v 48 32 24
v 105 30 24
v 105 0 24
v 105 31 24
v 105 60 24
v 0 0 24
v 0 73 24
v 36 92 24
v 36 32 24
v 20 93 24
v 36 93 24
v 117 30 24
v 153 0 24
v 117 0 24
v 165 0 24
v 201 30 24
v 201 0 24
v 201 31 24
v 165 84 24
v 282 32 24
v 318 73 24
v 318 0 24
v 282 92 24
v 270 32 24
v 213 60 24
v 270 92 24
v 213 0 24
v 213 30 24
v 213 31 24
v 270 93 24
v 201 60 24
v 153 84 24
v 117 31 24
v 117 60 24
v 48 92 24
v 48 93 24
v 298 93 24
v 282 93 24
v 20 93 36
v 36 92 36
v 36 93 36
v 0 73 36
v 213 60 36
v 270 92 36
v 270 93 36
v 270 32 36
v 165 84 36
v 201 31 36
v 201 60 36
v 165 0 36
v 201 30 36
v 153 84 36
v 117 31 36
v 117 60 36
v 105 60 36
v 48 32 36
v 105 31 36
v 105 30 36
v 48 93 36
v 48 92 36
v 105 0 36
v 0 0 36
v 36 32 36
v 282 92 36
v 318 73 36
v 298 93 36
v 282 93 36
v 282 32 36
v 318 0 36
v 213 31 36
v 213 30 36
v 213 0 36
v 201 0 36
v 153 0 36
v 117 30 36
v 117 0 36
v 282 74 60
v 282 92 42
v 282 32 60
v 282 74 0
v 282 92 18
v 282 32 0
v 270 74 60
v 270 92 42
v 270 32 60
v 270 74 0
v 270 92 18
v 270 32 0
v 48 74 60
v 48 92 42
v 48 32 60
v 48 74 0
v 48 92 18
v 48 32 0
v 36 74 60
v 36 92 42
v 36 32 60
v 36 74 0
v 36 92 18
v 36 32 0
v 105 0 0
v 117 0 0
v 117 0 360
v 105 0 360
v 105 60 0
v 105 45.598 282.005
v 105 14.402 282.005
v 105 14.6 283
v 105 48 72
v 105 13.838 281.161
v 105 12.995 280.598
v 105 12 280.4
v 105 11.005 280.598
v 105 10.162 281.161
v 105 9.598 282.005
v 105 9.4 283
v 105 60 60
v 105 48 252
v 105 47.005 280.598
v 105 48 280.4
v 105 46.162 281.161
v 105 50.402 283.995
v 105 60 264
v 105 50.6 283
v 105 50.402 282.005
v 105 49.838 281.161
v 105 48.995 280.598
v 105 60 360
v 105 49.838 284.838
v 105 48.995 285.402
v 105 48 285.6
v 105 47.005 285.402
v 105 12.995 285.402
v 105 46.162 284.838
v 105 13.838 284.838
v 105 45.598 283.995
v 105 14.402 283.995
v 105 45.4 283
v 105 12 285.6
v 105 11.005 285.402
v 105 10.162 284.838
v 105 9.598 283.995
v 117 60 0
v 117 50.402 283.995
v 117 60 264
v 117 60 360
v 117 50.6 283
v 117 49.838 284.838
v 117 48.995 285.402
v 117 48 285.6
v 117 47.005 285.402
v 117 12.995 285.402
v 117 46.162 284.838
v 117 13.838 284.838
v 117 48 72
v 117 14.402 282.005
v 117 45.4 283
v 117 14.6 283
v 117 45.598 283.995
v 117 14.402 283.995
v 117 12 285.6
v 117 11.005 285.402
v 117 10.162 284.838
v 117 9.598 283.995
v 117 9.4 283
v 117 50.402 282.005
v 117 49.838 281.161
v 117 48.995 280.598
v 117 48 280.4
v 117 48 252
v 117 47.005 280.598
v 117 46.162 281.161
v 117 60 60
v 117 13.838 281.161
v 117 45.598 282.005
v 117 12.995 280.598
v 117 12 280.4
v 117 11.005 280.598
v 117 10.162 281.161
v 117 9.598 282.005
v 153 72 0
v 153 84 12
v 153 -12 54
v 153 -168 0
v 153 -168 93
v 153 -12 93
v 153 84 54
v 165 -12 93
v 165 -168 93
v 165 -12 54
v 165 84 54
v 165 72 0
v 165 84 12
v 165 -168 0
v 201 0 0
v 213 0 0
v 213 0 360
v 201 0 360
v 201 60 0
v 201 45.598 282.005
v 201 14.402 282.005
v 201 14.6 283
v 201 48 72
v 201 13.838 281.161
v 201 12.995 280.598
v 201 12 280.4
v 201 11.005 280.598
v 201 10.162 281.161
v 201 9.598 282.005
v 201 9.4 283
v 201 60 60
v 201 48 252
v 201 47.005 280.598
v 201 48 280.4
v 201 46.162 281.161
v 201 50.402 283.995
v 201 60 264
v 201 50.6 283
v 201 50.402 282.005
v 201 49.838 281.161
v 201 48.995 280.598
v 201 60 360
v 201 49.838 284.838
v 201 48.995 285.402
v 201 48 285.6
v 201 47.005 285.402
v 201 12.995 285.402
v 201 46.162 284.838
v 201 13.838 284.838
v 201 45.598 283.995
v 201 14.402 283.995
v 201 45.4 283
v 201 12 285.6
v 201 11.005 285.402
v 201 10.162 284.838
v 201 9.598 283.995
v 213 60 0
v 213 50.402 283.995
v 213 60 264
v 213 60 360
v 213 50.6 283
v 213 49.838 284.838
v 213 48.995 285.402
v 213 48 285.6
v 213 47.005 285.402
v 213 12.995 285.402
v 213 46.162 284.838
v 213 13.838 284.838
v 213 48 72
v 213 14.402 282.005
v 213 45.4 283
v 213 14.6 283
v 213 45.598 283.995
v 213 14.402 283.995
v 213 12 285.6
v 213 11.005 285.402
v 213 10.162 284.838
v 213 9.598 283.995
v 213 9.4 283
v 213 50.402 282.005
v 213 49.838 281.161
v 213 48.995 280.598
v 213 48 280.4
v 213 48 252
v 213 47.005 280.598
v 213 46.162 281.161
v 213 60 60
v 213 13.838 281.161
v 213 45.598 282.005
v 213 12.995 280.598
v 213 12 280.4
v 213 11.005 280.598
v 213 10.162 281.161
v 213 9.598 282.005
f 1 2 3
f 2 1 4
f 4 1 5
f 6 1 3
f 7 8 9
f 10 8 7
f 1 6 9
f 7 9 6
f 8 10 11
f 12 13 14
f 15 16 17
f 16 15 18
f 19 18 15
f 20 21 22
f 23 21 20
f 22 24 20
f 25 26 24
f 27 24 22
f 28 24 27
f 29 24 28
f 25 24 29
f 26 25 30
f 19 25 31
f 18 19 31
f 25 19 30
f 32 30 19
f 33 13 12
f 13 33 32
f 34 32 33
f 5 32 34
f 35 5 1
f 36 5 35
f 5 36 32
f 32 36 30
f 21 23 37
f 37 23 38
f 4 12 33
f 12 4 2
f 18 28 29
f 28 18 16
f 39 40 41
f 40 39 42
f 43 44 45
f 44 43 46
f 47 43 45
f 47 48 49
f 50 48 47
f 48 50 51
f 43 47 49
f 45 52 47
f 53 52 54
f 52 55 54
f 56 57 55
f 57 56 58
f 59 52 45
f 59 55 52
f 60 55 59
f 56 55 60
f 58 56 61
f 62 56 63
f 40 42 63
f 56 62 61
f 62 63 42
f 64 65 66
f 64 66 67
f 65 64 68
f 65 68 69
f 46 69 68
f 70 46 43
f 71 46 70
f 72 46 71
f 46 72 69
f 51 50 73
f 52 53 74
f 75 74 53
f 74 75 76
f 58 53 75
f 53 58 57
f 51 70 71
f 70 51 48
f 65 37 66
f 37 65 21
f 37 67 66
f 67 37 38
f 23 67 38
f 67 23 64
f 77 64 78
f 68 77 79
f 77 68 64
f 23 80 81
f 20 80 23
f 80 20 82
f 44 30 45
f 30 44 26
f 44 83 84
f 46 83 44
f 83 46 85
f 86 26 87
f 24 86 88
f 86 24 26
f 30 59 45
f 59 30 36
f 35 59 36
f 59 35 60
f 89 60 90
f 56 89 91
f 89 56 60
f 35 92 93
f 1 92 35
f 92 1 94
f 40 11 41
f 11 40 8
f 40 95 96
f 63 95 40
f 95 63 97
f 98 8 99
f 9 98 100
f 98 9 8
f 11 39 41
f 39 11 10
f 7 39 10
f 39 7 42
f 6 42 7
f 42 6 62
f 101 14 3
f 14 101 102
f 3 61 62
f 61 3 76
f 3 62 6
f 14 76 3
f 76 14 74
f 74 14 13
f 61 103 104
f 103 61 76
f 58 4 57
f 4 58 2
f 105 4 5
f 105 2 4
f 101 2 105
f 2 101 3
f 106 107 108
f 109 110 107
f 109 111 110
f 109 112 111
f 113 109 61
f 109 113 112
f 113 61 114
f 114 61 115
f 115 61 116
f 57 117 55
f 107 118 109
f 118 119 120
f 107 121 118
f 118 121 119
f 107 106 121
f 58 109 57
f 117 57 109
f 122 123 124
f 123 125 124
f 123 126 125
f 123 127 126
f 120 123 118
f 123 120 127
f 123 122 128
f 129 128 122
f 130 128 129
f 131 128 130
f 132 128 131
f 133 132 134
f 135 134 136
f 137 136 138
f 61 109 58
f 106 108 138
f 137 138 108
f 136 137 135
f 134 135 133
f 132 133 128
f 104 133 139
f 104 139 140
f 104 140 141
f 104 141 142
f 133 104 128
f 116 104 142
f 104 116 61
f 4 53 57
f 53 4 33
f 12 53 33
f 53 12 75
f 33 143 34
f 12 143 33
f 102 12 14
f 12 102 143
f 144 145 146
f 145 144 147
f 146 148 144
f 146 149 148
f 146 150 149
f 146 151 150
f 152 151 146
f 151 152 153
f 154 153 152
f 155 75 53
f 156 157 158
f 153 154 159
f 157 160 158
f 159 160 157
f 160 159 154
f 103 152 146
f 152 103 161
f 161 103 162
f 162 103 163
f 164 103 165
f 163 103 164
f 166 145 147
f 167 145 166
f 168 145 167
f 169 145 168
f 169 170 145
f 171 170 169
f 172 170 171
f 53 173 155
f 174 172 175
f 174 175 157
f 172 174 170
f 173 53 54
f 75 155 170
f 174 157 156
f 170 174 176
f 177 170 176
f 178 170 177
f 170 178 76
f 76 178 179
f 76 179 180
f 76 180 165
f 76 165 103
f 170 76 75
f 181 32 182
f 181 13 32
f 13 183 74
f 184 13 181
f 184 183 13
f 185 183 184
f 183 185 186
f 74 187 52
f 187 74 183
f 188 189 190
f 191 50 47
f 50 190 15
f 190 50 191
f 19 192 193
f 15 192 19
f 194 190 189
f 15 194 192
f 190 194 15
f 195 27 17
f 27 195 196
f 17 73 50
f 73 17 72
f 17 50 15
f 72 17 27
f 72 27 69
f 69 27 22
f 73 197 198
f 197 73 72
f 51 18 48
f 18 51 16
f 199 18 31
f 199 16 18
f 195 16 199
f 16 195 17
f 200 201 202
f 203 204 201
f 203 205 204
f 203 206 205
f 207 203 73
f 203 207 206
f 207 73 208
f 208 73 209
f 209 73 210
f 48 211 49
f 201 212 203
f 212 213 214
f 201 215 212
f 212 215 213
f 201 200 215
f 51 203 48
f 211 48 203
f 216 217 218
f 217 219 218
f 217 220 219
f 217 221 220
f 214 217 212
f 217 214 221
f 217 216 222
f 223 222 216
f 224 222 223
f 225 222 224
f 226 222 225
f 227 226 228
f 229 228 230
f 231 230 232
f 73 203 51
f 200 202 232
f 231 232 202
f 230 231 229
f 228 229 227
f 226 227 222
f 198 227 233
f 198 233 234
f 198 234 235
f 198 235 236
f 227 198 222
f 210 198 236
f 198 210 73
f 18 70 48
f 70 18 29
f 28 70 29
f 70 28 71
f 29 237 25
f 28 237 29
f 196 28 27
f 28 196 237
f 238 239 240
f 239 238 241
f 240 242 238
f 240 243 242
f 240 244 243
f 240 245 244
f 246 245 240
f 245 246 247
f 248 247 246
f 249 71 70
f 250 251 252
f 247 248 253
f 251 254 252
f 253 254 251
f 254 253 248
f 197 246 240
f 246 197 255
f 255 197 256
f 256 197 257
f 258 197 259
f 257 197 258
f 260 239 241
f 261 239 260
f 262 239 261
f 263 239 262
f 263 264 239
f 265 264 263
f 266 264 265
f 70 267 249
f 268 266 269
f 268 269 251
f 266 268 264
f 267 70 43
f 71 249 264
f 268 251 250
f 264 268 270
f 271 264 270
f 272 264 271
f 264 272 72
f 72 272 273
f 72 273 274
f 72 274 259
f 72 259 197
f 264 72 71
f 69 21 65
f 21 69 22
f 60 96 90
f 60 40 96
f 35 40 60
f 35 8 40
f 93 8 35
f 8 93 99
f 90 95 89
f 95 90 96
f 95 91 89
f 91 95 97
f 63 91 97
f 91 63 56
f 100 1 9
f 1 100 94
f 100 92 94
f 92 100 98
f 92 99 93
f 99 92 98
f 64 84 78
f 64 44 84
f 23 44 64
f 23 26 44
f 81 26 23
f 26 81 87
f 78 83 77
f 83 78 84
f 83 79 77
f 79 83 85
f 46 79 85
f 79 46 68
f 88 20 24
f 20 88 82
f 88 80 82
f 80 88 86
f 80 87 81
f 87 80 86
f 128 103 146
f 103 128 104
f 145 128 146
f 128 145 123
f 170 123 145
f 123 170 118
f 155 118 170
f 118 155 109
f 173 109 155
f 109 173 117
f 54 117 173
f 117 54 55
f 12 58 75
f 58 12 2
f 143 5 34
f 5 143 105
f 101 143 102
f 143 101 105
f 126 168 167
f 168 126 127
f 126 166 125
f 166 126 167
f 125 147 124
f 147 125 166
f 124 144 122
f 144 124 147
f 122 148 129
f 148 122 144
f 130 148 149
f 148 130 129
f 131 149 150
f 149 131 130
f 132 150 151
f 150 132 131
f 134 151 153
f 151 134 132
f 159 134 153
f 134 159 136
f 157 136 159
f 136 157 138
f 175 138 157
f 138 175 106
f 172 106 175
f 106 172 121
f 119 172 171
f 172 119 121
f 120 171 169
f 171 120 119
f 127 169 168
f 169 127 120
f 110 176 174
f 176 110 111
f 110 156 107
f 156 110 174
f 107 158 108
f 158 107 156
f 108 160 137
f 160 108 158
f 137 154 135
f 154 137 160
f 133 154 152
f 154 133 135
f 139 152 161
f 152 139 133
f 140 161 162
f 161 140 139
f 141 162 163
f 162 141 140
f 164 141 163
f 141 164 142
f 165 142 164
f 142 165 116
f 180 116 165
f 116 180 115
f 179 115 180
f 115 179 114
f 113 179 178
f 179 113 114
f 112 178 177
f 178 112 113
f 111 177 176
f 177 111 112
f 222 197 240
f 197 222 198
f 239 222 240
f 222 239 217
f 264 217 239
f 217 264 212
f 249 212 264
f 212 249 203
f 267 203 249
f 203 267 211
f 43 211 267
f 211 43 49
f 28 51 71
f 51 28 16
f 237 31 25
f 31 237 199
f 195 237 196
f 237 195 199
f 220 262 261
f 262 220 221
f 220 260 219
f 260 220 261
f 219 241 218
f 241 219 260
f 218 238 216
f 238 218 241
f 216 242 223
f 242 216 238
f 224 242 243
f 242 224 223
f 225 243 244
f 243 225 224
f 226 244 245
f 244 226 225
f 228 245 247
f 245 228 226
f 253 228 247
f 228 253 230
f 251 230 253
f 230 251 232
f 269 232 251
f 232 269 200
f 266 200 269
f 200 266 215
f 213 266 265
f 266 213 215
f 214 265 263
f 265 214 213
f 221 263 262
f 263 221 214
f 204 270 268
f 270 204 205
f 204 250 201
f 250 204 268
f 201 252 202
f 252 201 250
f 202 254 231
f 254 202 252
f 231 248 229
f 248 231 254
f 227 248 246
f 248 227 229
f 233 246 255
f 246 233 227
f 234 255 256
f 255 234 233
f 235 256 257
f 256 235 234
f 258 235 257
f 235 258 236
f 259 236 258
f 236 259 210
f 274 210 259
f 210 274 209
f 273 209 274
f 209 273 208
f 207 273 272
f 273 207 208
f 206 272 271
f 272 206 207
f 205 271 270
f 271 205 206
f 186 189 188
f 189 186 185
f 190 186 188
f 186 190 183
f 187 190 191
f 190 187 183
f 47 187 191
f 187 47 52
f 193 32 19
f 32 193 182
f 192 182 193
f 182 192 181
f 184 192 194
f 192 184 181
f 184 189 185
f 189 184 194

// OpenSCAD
// ==========================================================================
//  GENERATED FILE -- DO NOT EDIT.
//  Produced by build/build.py from components/Turtle_Bottom_Ballast_Fin.scad
//  Turtle Body version 6.7.4
//  Edit lib/ and src/ instead, then run: python3 build/build.py
// ==========================================================================
/*
 Hope Turtle — standalone ballast attachment. Units: mm.
 License: CERN-OHL-S-2.0.
 Two green core slats, one orange bottom board, two red lock feet, one
 yellow ballast fin. No bottle. Individual pieces lie flat on Z=0;
 the assembly raises its lowest component to Z=0.

 SOURCE FILE — geometry lives in lib/ballast_fin.scad + lib/params.scad.
 The committed self-contained file is generated by build/build.py.
*/

part = "assembly"; // [assembly,core_slat,bottom_board,lock_foot,fin]
enable_color_coding = true;
ballast_fin_inspection_pullout = 0; // mm; 0 seats the fin

// [bundle] begin use <../../lib/ballast_fin.scad>
// ==========================================================================
//  Turtle Body -- bottom ballast attachment  (lib module)
// --------------------------------------------------------------------------
//  Two green core slats, one orange bottom board, two red lock feet, one
//  yellow ballast fin. No bottle. See CLAUDE.md s12.
//
//  Use clear inner-face spacing (= bottle_diameter), not centre spacing, for
//  bottle clearance. The yellow fin's bottle-seat cut is enlarged by one
//  stock thickness so the bottle clears it -- preserved here. Ballast joints
//  keep nominal stock slot widths (the rear fin's 0.2 mm allowance is NOT
//  added here).
//
//  Definitions only. Geometry is emitted by local_ballast_assembly() or the
//  individual part modules.
// ==========================================================================

// [bundle] begin use <params.scad>
// ==========================================================================
//  Turtle Body -- shared dimension contract
// --------------------------------------------------------------------------
//  The single source of truth for every dimension that more than one
//  subsystem depends on. Values are exposed as zero-argument functions so
//  this file can be pulled in with `use <params.scad>` (which ignores
//  top-level variable assignments) without polluting any namespace.
//
//  lib/ modules take these as DEFAULT argument values:
//      module control_cap(roof_t = p_cap_roof_t(), ...) { ... }
//  so a src/ wrapper can still override one value from its customizer block
//  while every other subsystem keeps the shared number.
//
//  Rules:
//   * one function per concept, canonical name (see CLAUDE.md cross-file table)
//   * derived values are functions of other p_*() functions, never re-typed
//   * mm throughout; names say _d (diameter), _r (radius), _t (thickness),
//     _len / _h (axial), _af (hex across-flats)
//   * do NOT add a bare `x = ...;` here -- bundle.py / lint.py will reject it
// ==========================================================================

// ---- tolerances and render quality --------------------------------------
function p_eps()          = 0.02;   // Boolean overlap / cut-through fudge
function p_fit_clearance() = 0.2;   // wood joint: TOTAL extra slot width, centred on the board
function p_fn_plastic()   = 120;    // printed PLA parts (cap, cage, axle, mold)
function p_fn_wood()      = 96;     // cut wooden parts
function p_fn_curve()     = 180;    // fine profile curves (bottle, sails)

// ---- bottle (the foundation reference) ---------------------------------
function p_bottle_d()        = 84;    // outside diameter (was 86, and 82 before that; other bottle dims held)
function p_bottle_h()        = 305;   // total height incl. ordinary screw cap
function p_bottle_wall_t()   = 0.5;   // modelling assumption, not a measurement
function p_bottle_cap_d()    = 31;    // ordinary screw cap (NOT the control-cap disk)
function p_bottle_cap_h()    = 17;    // ordinary screw cap height (rear-fin / ballast formulas)
function p_collar_d()        = 34;    // bottle collar, independent of cap diameter
function p_top_dome_h()      = 62;
function p_bottom_dome_h()   = 25;
function p_dome_power()      = 2.5;   // superellipse exponent
function p_bottle_neck_h()   = 5;
function p_bottle_collar_h() = 1;
function p_bottle_neck_d()   = p_bottle_cap_d() - 3;   // 28: neck is 3 mm under the cap
function p_bottle_base_ratio() = 0.88; // slightly narrower footprint at the base
function p_bottle_profile_steps() = 16;
// cut bottle (control head): the lower dome is removed and a short socket is
// bored so the control-cap insert slides in. Cut plane sits 5 mm above the
// bottom dome height.
function p_bottle_cut_extra()  = 5;
function p_bottle_cut_height() = p_bottom_dome_h() + p_bottle_cut_extra();   // 30

// nominal bottle interior and the cap insert that enters it
function p_bottle_socket_d() = p_bottle_d() - 2 * p_bottle_wall_t();          // 81
function p_insert_shaft_radial_clearance() = 1;
function p_insert_shaft_d()  = p_bottle_socket_d()
                             - 2 * p_insert_shaft_radial_clearance();          // 79

// ---- wooden stock -----------------------------------------------------
function p_wood_t()          = 12;    // shared board / slat thickness
function p_fin_board_w()     = 93;    // shared fin-system stock width
function p_screw_side_offset() = 17;  // mounting-hole inset from a John end (was 25 until v4.2.0)

// ---- Ecojoiner port --------------------------------------------------
// A port must swallow the bottle's tapered top (the top dome) plus a seating
// allowance, so its axial length is DERIVED from the bottle, not fixed. This
// is the same rule the HopeTurtles.org generators use
// (port_length = taper_height + port_allowance); until 2026-09-08 lib carried
// the evaluated constant 82 instead, which silently broke the rule for any
// bottle other than the reference one. Ballast and Ecojoiner both read it.
function p_port_allowance()  = 20;                 // seating allowance beyond the dome
function p_port_length()     = p_top_dome_h() + p_port_allowance();   // 62 + 20 = 82
function p_port_height()     = p_bottle_d();       // opening height == bottle diameter (asserted)

// ---- M6 hardware ---------------------------------------------------
function p_m6_clearance_d()  = 6.4;   // M6 clearance hole
function p_m6_bolt_shaft_d() = 6;     // visual placeholder only
function p_m6_bolt_head_d()  = 12;
function p_m6_bolt_head_t()  = 4;

// ---- Ecojoiner bottle clamp: M5 cap screws + acorn nuts (v5.0.0/v5.1.0) --
// Replaces the M6 bolt + 12 mm presser disk. Each John port end carries TWO
// black M5 x 30 socket-head cap screws, stacked across the John height (one
// above, one below the centreline). v5.1.0: no nut -- each screw BITES into
// a 5.2 mm hole in the wood (builder's research; not verified here), so the
// screw itself holds its position and is adjusted with a hex key from
// outside. A black acorn (cap) nut, run fully onto the tip, bears on the
// bottle. Hardware sizes are ISO 4762 / DIN 1587 nominals for visual and
// stack checks only -- measure the hardware you buy.
// Bite-fit hole (was 5.5 clearance in v5.0.0). NOTE it is slightly LARGER
// than the 5 mm nominal major diameter: the hold relies on wood fibre
// springback around the thread, per the builder's own tests -- unverified
// here, and likely to vary with species, moisture and drill quality.
function p_m5_hole_d()           = 5.2;
function p_m5_bolt_d()           = 5;     // visual shank (plain cylinder)
function p_m5_bolt_len()         = 30;    // shank length under the head
function p_m5_head_d()           = 8.5;   // ISO 4762 socket head
function p_m5_head_h()           = 5;
function p_m5_acorn_af()         = 8;
function p_m5_acorn_h()          = 10;    // overall, hex base to dome tip
function p_m5_acorn_thread_depth() = 7;   // usable thread before the bolt bottoms
// Pair layout, shared by the John holes and every board bolted through them
// (rear-fin shafts, ballast core slats): each bolt sits this far in from a
// John long edge, i.e. +-p_eco_screw_pair_offset() from the John centreline.
function p_eco_screw_edge_inset()  = 12;   // was 10 until v5.2.0
function p_eco_screw_pair_offset() =
    (p_port_height() - 2 * p_wood_t()) / 2 - p_eco_screw_edge_inset();   // 18

// ---- pressor (EXPERIMENTAL, v6.6.1; lib/pressor.scad, CLAUDE.md s13a) ----
//  A board block in the port gap between a Little John and the bottle,
//  concave-cut to the bottle radius. The John's M5 pair passes into two
//  plain clearance holes in its back edge and pushes it onto the bottle as
//  the screws are turned in -- replaces the acorn nut. Two per port, one
//  each side of the bottle.
function p_pressor_t()          = 15;    // v6.7.4: pressor board thickness (along the bottle axis);
                                          // its own stock, the Johns stay on p_wood_t() 12
function p_pressor_wrap()       = p_bottle_d() / 4;  // 21: inner edge reaches this far past the
                                                      // bottle's tangent line, toward its axis
function p_pressor_travel()     = 1;     // screw-in travel: gap left at the John face when pressed
function p_pressor_hole_d()     = 6;     // v6.7.4: plain Ø6 clearance hole for the John's M5 screw
                                          // (was a 5.3 x 25.3 pill slot; the Johns keep p_m5_hole_d() 5.2)
function p_pressor_hole_depth() = 8;     // hole depth into the pressor's back edge (v6.6.4: was 10)
function p_pressor_min_wall()   = 3;     // least wood around / beyond a screw hole (asserted)
function p_pressor_end_trim()   = 1.5;   // v6.6.4: taken off EACH end (top/bottom edge) -- the printed
                                          // prototype was 3 mm too long to enter the port

// ---- control cap (large stationary disk; see CLAUDE.md s7) ----------
//  TB-03 resolution: repository 5 mm roof / 2 mm boss is authoritative;
//  the axle (below) is derived to this datum.
function p_cap_disk_d()      = 102;   // control-cap disk (independent of p_bottle_cap_d; was 100, +2 mm)
function p_cap_roof_t()      = 5;     // disk / roof thickness
function p_cap_boss_depth()  = 0;     // extra projection of the centre boss into the hollow cap.
                                       // 0 = no boss, flat cavity ceiling (v6.5.1; was 1.5, before that 2)
function p_cap_boss_d()      = 18;
function p_cap_insert_len()  = 35;    // straight insert shaft length
function p_cap_insert_wall_t() = 4;
function p_cap_entry_chamfer_h()     = 1;
function p_cap_entry_chamfer_delta() = 1;
function p_cap_axle_bore_d() = 6;     // loose: 0.5 mm radial clearance to the Ø5 steel shaft (was 8.7 for Ø8 PLA)
function p_cap_cage_radial_clearance() = 1;   // cap disk -> cage inner wall (radial)
function p_cap_total_h()     = p_cap_roof_t() + p_cap_insert_len();           // 40
function p_cap_bearing_len() = p_cap_roof_t() + p_cap_boss_depth();           // 5 (was 6.5, 7)

// buttons (through both cap and cage)
function p_button_upper_d()  = 17;    // clearance hole in the cap
function p_button_axis()     = "y";   // "x" or "y"
function p_button_radius()   = 25;    // radial position of the two button centres (50 mm apart;
                                       // was 24 / 48 mm -- shared with the cage's matching bore)

// ---- silicone seal grooves + rings (CLAUDE.md s8) ------------------
function p_seal_groove_count()      = 2;
function p_seal_groove_axial_h()    = 2.7; // groove height (was 3.5; retuned to just clear
                                            // the 2.6 mm ring axial thickness below, 0.1 mm margin)
function p_seal_groove_radial_depth() = 2; // groove depth
function p_seal_groove1_from_shoulder() = 12;  // groove centre, measured from the insert SHOULDER
function p_seal_groove2_from_shoulder() = 25;
function p_seal_ring_axial_t()      = 2.6;  // cast ring thickness (was 3)
function p_seal_ring_radial_w()     = 10;   // cast ring radial width (was 5; doubled). NOT validated.
function p_seal_ring_elasticity_reduction() = 0.25;
    // Cast the ring's inner diameter this fraction SMALLER than the groove
    // root it mates to, so real (stretchy) silicone is under tension --
    // and therefore actually grips -- once stretched onto the cap, instead
    // of sitting at a 1:1 as-cast fit. Tweak this here as real silicone
    // behaviour is characterized; NOT validated (see lib/silicone_ring_mold.scad).
function p_seal_groove_root_d() = p_insert_shaft_d()
                                - 2 * p_seal_groove_radial_depth();            // 79 at the 86 mm bottle

// ---- sail shaft: uniform round centre axle (CLAUDE.md s9) ----------
//  Derived to the 5/2 cap datum (TB-03/TB-04). round_inside_cap is measured
//  from the roof underside and INCLUDES the boss -- do not add the boss again.
//  TB-08: the shaft is now one uniform round bar top to bottom -- no hex
//  section. It free-spins in the cap bore (p_cap_axle_bore_d) and passes
//  with a light running clearance through the cage hub bore and the top
//  sail bar's own hole (both p_axle_shaft_hole_d()); it locks to the
//  ROTATING cage with a single M3 set screw through the cage hub
//  (p_cage_setscrew_pilot_d()) rather than a shaped (hex) interference fit.
function p_axle_round_d()        = 5;    // Ø5 steel rod (v6.4.0; was an Ø8 printed PLA shaft)
function p_axle_round_ext()      = 1;    // projection above the cap's outer face
function p_axle_round_inside_cap() = p_cap_insert_len() - 5;  // 30: roof underside to round end (incl. boss)
function p_axle_round_len()      = p_axle_round_inside_cap() + p_cap_roof_t() + p_axle_round_ext();  // 36
function p_axle_upper_len()      = 23;   // continues up through the cage hub + sail bar (was the hex length)
function p_axle_total_len()      = p_axle_upper_len() + p_axle_round_len();
function p_axle_shaft_clearance() = 0.4; // snug fit, diametral (was 0.2 on the Ø8 shaft): any hole the shaft passes
                                          // (but does not bear in) is p_axle_round_d() + this
function p_axle_shaft_hole_d()   = p_axle_round_d() + p_axle_shaft_clearance();  // 5.4 (cage hub bore)
function p_magnet_d()            = 3;    // AS5600 sensing magnet recess
function p_magnet_t()            = 1;

// ---- axle rotary shaft O-ring (waterproofs the axle bore; cast in the mold) ----
//  A round-section O-ring seated in a gland in the control-cap bore, sealing
//  against the spinning round section of the axle. ID is tied to the shaft.
function p_axle_oring_cs()     = 2.0;                                   // cross-section
function p_axle_oring_id()     = p_axle_round_d();                      // 5 -- hugs the shaft
function p_axle_oring_od()     = p_axle_oring_id() + 2 * p_axle_oring_cs();          // 9
function p_axle_oring_mean_r() = (p_axle_oring_id() + p_axle_oring_cs()) / 2;        // 3.5
//  gland cut into the cap bore for it
function p_cap_oring_squeeze()      = 0.25;  // radial squeeze on the seal
function p_cap_oring_gland_od()     = p_axle_oring_od() - 2 * p_cap_oring_squeeze(); // 8.5
function p_cap_oring_gland_w()      = 1.3 * p_axle_oring_cs();                       // 2.6 axial
function p_cap_oring_gland_from_face() = p_cap_bearing_len() / 2; // gland centre, from the cap outer face, along the bore
                                         // (2.5 = mid-roof since the boss went in v6.5.1; was 3.5)

// ---- rotating control cage (CLAUDE.md s6) ------------------------
function p_cage_wall_t()     = 6.5;   // radial wall thickness
function p_cage_roof_t()     = 4;     // roof / surface plate thickness
function p_cage_inner_d()    = p_cap_disk_d() + 2 * p_cap_cage_radial_clearance();   // 102
function p_cage_outer_d()    = p_cage_inner_d() + 2 * p_cage_wall_t();               // 115
function p_cage_skirt_depth()   = 44;   // roof underside to the ORIGINAL skirt rim
function p_cage_peak_extension() = 20;  // crest extends this far past the original rim
function p_cage_valley_wall_h()  = 10;  // minimum wall depth between mounts
function p_cage_total_h()    = p_cage_skirt_depth() + p_cage_roof_t();              // 48 (native)
function p_cage_notch_count()   = 4;
function p_cage_notch_w()    = 22.5;  // batten groove width
function p_cage_notch_depth() = 3.7;
function p_cage_wave_segments() = 240;
function p_cage_hub_d()      = 29;
function p_cage_pocket_d()   = 26;    // top clip pocket (control_cage top_pocket, OFF by default)
function p_cage_pocket_depth() = 4;   //   "        "     "
// TB-08: hex bore replaced by a plain round bore (p_axle_shaft_hole_d(),
// shared with the sail bar) + a radial M3 set screw that locks the cage to
// the shaft -- see p_cage_setscrew_*() below.
function p_cage_bearing_d()  = 9;     // hemispherical bearing bump
function p_cage_bearing_count() = 8;
function p_cage_bearing_pcd() = p_cap_disk_d() - p_cage_bearing_d() + 0.5;          // 91.5
function p_cage_top_hole_d() = 18;    // button / access hole through the roof (v6.5.2: back to 18 from 22;
                                       // the 22 opened onto the hub for set-screw access, off since v6.0.0)
function p_cage_mount_hole_d() = 3.2; // two M3 clearance holes per batten / groove
function p_cage_mount_pitch()  = 32;  // vertical pitch of the pair
function p_cage_lower_hole_from_tip() = 10;
// Single radial M3 set (grub) screw through the hub wall, pressing on the
// shaft to lock cage <-> shaft rotation (TB-08). Self-tapping into the
// printed PLA hub -- not a clearance hole for a separate nut, unlike the
// batten/mount M3 holes above. Pilot diameter is an untested starting
// point (typical M3-into-rigid-plastic self-tap pilots run 2.5-2.8 mm) --
// verify real thread engagement and tapping torque before relying on it.
function p_cage_setscrew_pilot_d() = 2.5;
// v6.0.0: the hub set screw (and its access recess) is switched OFF -- the
// M3 in the sail crossbar connector now clamps the shaft. Kept, not deleted,
// so it can be turned back on.
function p_cage_setscrew_enabled() = false;
// Flat-floored access recess around the set screw, cut into the hub face the
// roof button opening uncovers, running the hub's full height (roof top down
// through the hub bottom). Width is tangential, depth is radial (inward from
// the opening's inner edge).
function p_cage_setscrew_recess_w()     = 5;
function p_cage_setscrew_recess_depth() = 3;
// Set-screw angle is no longer a separate parameter: control_cage() aims it
// at the centre of the roof button opening (button_angle) so a hex key can
// reach it through that opening.
// 45-deg outward chamfer on the roof-top outer edge (0 = sharp). The cage
// prints roof-face-down, so this bevel flares OUT from the bed and stays
// printable; it runs the full perimeter, batten grooves included. See
// lib/control_cage.scad.
function p_cage_roof_bevel() = 3;

// ---- sail apparatus (CLAUDE.md s10) ---------------------------
// SAIL battens. v6.0.0: the upper notch holds two stacked layers (connector
// below, crossbar half above), so the batten grew by the extra layer: 205 +
// 2t (229) at first, trimmed back by t to 205 + t (217) in v6.1.0 so 15 mm of
// batten stands above the notch again. Batten bottom, cage M3 holes and the
// lower rails do not move. The NON-sail battens are shorter: their top is
// flush with the cage roof top (derived in lib/sail_frame.scad, 178 mm).
function p_side_batten_h()   = 205 + p_wood_t();       // 217
function p_side_batten_w()   = 20;
// v6.5.0: battens are cut from the same board as every other slat (were a
// separate 20 x 10 stock), so their radial thickness -- and every slot that
// takes a batten -- is the board thickness.
function p_side_batten_radial_t() = p_wood_t();     // 12 (was 10)
// Top crossbar span, tip to tip: 6 x bottle_d (504). v6.1.0 briefly made each
// half a head-fin-slat length (span 843.6); v6.2.0 reverted it -- the sails
// came out too big. The halves are derived from this span.
function p_top_crossbar_len() = 6 * p_bottle_d();   // 504 (halves 212.2 each)
function p_top_crossbar_w()  = 22;
function p_top_crossbar_t()  = p_wood_t();          // 12
// v6.0.0: the top crossbar is split into a LEFT and RIGHT half plus a
// centre "sail crossbar connector". The connector lies on the cage roof and
// spans between the two sail battens; each half lies on top of it and runs
// out to its tip. Both layers half-lap into the same (now 2t tall) sail-batten
// notch, and one M3 per side screws the half down into the connector.
// The shaft passes the connector with generous clearance (no bearing), and an
// M3 self-tapped in from the connector's side face clamps it, locking frame,
// cage and shaft together (replaces the cage hub set screw).
function p_sail_connector_axle_hole_d()  = 6;     // Ø5 steel shaft, 0.5 mm radial clearance (v6.4.0; was 9 for the Ø8 shaft)
function p_sail_m3_pilot_d()             = 2.8;   // self-tap pilot: clamp screw + the half-to-connector screws
function p_sail_m3_clear_d()             = p_cage_mount_hole_d();   // 3.2, through the top (half) layer
function p_sail_connector_overhang()     = 15;    // connector past each sail batten's outer face
function p_sail_bar_half_inboard()       = 15;    // each half runs this far inboard of its batten
function p_bottom_rail_len() = 3 * p_bottle_d() + p_wood_t();   // 264 (v6.3.0: +t; 252 in v6.2.0, 360 in v6.1.0)
function p_bottom_rail_bottle_clearance() = 1;
function p_sail_rail_color()  = [0.56, 0.39, 0.39]; // brown (top AND bottom rails)
function p_c_piece_color()    = [1.0, 0.52, 0.20];  // orange, retained

// ---- rear fin + solar support (CLAUDE.md s11) ----------------
function p_solar_panel_w() = 148;
function p_solar_panel_h() = 223;
function p_solar_panel_t() = 2.5;    // real panel, independent of wood thickness
// The green shafts overlap the yellow fin over X = 0..p_rear_shaft_rear_x()
// (the half-lap zone, 84 mm). v5.3.0: the bottle base must ABUT the fin's
// front edge (X = 0) so the fin holds the bottle in its port -- previously
// the full turtle seated the bottle base at the shafts' rear end, putting the
// first 84 mm of the fin inside the bottle. The shaft front (and its John
// hole pair) stays where it was, so the shafts grow by exactly that overlap:
//   334 (old approved formula) + 84 = 418.
// v5.7.0: the yellow fin is exactly one board wide (it was board + a 15 mm
// "rear tab", 108 mm -- wider than the 93 mm board it is cut from), so the
// overlap is board width - 2t: 84 -> 69, shaft 418 -> 403, half-lap 42 -> 34.5.
function p_rear_shaft_rear_x() = p_fin_board_w() - 2 * p_wood_t();             // 69
function p_rear_shaft_len() = p_bottle_h()
                            + (2/3) * (p_fin_board_w() - 2 * p_wood_t())
                            - p_bottle_cap_h()
                            + p_rear_shaft_rear_x();                            // 403 (418 v5.3.0-v5.6.0)
function p_rear_half_lap_engagement() = p_rear_shaft_rear_x() / 2;  // 34.5 green/yellow interlock depth
// v5.4.0: the green shaft is as wide as the Ecojoiner John it bolts flush
// against (John height = port height - 2 x stock), so their edges and M5 pair
// line up. Was a fixed 59 -- 1 mm narrower than the 60 mm John, and the M5
// pair (centred on it) sat 11.5 mm in from its edges instead of 12.
function p_rear_shaft_width()   = p_port_height() - 2 * p_wood_t();            // 60
// TB-07: the green-slat mounting hole follows the mating Ecojoiner John, not a
// fixed 50 mm. Derived from the install transform; the john_length/2 terms
// cancel, leaving a pure function of the shared contract (= 113 at defaults).
// v5.3.0: the install now seats the bottle base at fin X = 0 (not at the
// shaft rear, X = p_rear_shaft_rear_x()), so that overlap is subtracted back
// out -- the hole stays 113 mm from the (unmoved) shaft front.
function p_rear_shaft_hole_from_front() =
    p_rear_shaft_len() - p_rear_shaft_rear_x() - p_screw_side_offset()
    - p_bottle_h() + p_bottle_cap_h() + p_port_height();

// ---- head fin: front fin (v5.8.0, EXPERIMENTAL; triangle since v6.3.0) ---------
// The rear fin's mirror on the front (-X / physical 9 o'clock) port: two
// flat slats above and below the front bottle bolt to the same Little John
// M5 pairs and run the length of the bottle; a vertical triangular fin
// half-laps into their outer ends and abuts the bottle base. Not built or
// tested. See lib/head_fin.scad.
//  * fin width (forward, along the bottle axis) = the widest board, so the
//    fin is cut across one board (its height runs along the board's length)
//  * the slats reach exactly as far into the Ecojoiner as the rear shafts,
//    so their M5 pair lands at the same distance from the slat front
function p_head_fin_w()       = p_fin_board_w();                         // 93
function p_head_fin_h()       = p_bottle_d() + 6 * p_wood_t();           // 156: 2t of fin beyond each slat
function p_head_slat_overlap() = 4 * p_wood_t();                         // 48: slat run into the fin
// v6.3.1 profile (v6.3.0 had the slope the other way): the TOP edge runs
// out only to this X (where the slats end); the leading edge slopes down and
// FORWARD from there to a vertical flat "toe" at the full fin width, which
// meets the bottom edge. Full width along the BOTTOM edge.
function p_head_fin_heel_x()  = p_head_slat_overlap();                   // 48: top-edge length
function p_head_fin_toe_h()   = 3 * p_wood_t();                          // 36: vertical flat nose at the bottom front (v6.3.4; was 2t)
// v6.3.2: the fin extends DOWN below p_head_fin_h()'s bottom by this much (top
// unchanged), and its new bottom-front corner is set back, giving a raked
// forefoot below the toe flat.
function p_head_fin_drop()    = 3 * p_wood_t();                          // 36
function p_head_fin_forefoot_setback() = p_head_fin_drop();             // 36: = drop -> 45 deg cut (v6.3.3; was 18)
function p_head_half_lap_engagement() = p_head_slat_overlap() / 2;       // 24
function p_head_slat_reach()  = p_rear_shaft_len() - p_rear_shaft_rear_x();   // 334: bottle base -> slat front
function p_head_slat_len()    = p_head_slat_reach() + p_head_slat_overlap();  // 382
function p_head_slat_width()  = p_rear_shaft_width();                    // 60 == John height
function p_head_slat_hole_from_front() = p_rear_shaft_hole_from_front(); // 113: same reach -> same John pair

// ---- ballast attachment (CLAUDE.md s12) ---------------------
function p_ballast_core_w()   = p_port_height() - 2 * p_wood_t();               // 60 == John height
function p_ballast_core_len() = p_bottle_h() - p_bottle_cap_h() + 6 * p_wood_t();  // 360
function p_ballast_slat_gap() = p_port_height();       // clear inner-face gap
function p_ballast_slat_spacing() = p_port_height() + p_wood_t();               // 96
function p_ballast_board_len() = 3.5 * p_bottle_d() + 2 * p_wood_t();   // 318 (v5.5.0: +2t, 3t ends past the foot slots)
function p_ballast_fin_len()   = 3 * p_bottle_d();     // 246
function p_ballast_lock_w()    = 5 * p_wood_t();       // 60

// ---- neutral wood shades (used when enable_color_coding = false) -------
// With the full colour code off, every wooden subsystem still renders in its
// OWN shade of brown so the parts stay visually separable. All are warm browns
// (R > G > B) spaced by lightness. The two large fins share one darker shade so
// they read as a matched pair, distinct from the rest of their own assembly.
function p_wood_shade_sail()     = [0.85, 0.66, 0.47]; // sail frame  (lightest)
function p_wood_shade_rear_fin() = [0.72, 0.50, 0.33]; // rear-fin shafts + solar holder
function p_wood_shade_eco()      = [0.62, 0.44, 0.28]; // Ecojoiner core
function p_wood_shade_ballast()  = [0.52, 0.34, 0.22]; // ballast slats / board / locks
function p_wood_shade_fin()      = [0.40, 0.26, 0.17]; // rear fin + ballast fin, shared (darkest)
// [bundle] end   <params.scad>
// [bundle] begin use <util.scad>
// ==========================================================================
//  Turtle Body -- shared helper modules and functions
// --------------------------------------------------------------------------
//  Small pieces that were copy-pasted across the standalone files. Geometry
//  lives in the per-subsystem lib/ modules; this file is only glue.
//
//  Definitions only -- no top-level geometry, no top-level assignments.
// ==========================================================================

// [bundle] begin use <params.scad>
// [bundle] already inlined: params.scad
// [bundle] end   <params.scad>

// Colour wrapper for wooden parts. When colour coding is off, every wooden
// component renders in one neutral wood tone; bottles, hardware, sails and
// printed parts keep their own colours and never call this.
module wood_color(coded_color, enabled = true, neutral = [0.94, 0.83, 0.62]) {
    color(enabled ? coded_color : neutral) children();
}

// scalar clamp
function clamp(v, lo, hi) = v < lo ? lo : (v > hi ? hi : v);

// Visual-only M6 bolt: plain shaft + hex-less cylindrical head. No thread,
// no torque rating -- a placeholder for fit inspection.
//  Local Z=0 is the underside of the head; the shaft runs toward +Z from Z=0
//  (plus an optional tip_extension), the head sits at Z=-head_t..0. Matches
//  the standalone files.
module m6_bolt_placeholder(grip_length, tip_extension = 1,
                           shaft_d = undef, head_d = undef, head_t = undef,
                           color_rgb = [0.15, 0.15, 0.15], fn = 48) {
    sd = shaft_d == undef ? p_m6_bolt_shaft_d() : shaft_d;
    hd = head_d  == undef ? p_m6_bolt_head_d()  : head_d;
    ht = head_t  == undef ? p_m6_bolt_head_t()  : head_t;
    assert(grip_length > 0, "m6_bolt_placeholder: grip_length must be positive.");
    color(color_rgb)
        union() {
            cylinder(d = sd, h = grip_length + tip_extension, $fn = fn);
            translate([0, 0, -ht])
                cylinder(d = hd, h = ht, $fn = fn);
        }
}

// Regular hexagonal prism specified by across-flats width (OpenSCAD's
// cylinder($fn=6) is specified across corners, which is the usual trap).
module hex_prism_af(across_flats, h, center = false) {
    cylinder(d = across_flats / cos(30), h = h, $fn = 6, center = center);
}
// [bundle] end   <util.scad>

function bl_t()            = p_wood_t();
// The green core slats bolt flush against the Ecojoiner's Little Johns and
// clamp the bottle between them, so they follow the PORT height (== bottle
// diameter here; the HopeTurtles.org generator adds the form's fit offset):
// width == John height, inner-face gap == port height. v5.4.1: written in
// p_port_height() terms (same values) to make that tie explicit.
function bl_core_w()       = p_port_height() - 2 * bl_t();                       // 60 == John height
function bl_core_h()       = p_bottle_h() - p_bottle_cap_h() + 6.0 * bl_t();     // 360
function bl_lower_lobe()   = 2 * bl_t();
function bl_upper_lobe()   = 2 * bl_t();
function bl_core_slot_h()  = bl_t();
function bl_core_slot_depth() = bl_core_w() / 2;
function bl_neck_w()       = p_port_height() - 3 * bl_t();                       // 48
function bl_shoulder_step()   = bl_core_w() - bl_neck_w();                       // 12
// Distance from the slat top down to where the upper 45-degree shoulder cut
// begins. The seated slat top is port_length + t inside the outer John's
// port end, so the cut must start at least that far down or it bites into
// the slat while still inside the John. v5.6.0: was one port_height (84,
// 10 mm inside the John); now one board width lower and never above the
// John end -- max(port_height, port_length) + t (96 at defaults).
function bl_upper_diag_from_top() = max(p_port_height(), p_port_length()) + bl_t();
function bl_upper_diag_start() = bl_core_h() - bl_upper_diag_from_top();
function bl_upper_neck_start() = bl_upper_diag_start() - bl_shoulder_step();
function bl_core_slot_z0() = bl_lower_lobe();
function bl_core_slot_z1() = bl_core_slot_z0() + bl_core_slot_h();
function bl_lower_full_return() = bl_core_slot_z1() + bl_upper_lobe();
function bl_lower_neck_start()  = bl_lower_full_return() + bl_shoulder_step();
function bl_mount_hole_from_top() = p_port_length() + bl_t() - p_screw_side_offset();  // 77
function bl_mount_hole_x()  = bl_core_w() / 2;
function bl_mount_hole_y()  = bl_core_h() - bl_mount_hole_from_top();

function bl_board_len()    = p_ballast_board_len();                              // 318
function bl_board_w()      = p_fin_board_w();                                    // 93
function bl_board_slot_w() = bl_t();
function bl_board_slot_depth()  = p_fin_board_w() / 3;
function bl_center_slot_depth() = p_bottle_d() / 2;
function bl_center_slot()  = bl_board_len() / 2;
function bl_slat_spacing() = p_port_height() + bl_t();                          // 96
function bl_left_slot()    = bl_center_slot() - bl_slat_spacing() / 2;
function bl_right_slot()   = bl_center_slot() + bl_slat_spacing() / 2;
// Solid wood outboard of each red-foot slot. v5.5.0: 2 -> 3 board thicknesses
// (the board grew by 2*t to keep every slot where it was relative to centre)
// so the ends past the foot slots are less likely to split off.
function bl_end_slot_offset() = 3 * bl_t();                                      // 36
function bl_left_end_slot_x0()  = bl_end_slot_offset();
function bl_right_end_slot_x0() = bl_board_len() - bl_end_slot_offset() - bl_board_slot_w();
// 45-degree plan-view chamfer on both corners of the FRONT edge (y = board
// width, the red-foot-slot edge; the yellow fin trails aft from y = 0 in the
// full turtle). Legs are this long along each edge. v5.5.0.
function bl_board_front_chamfer() = 20;

function bl_lock_w()       = 5 * bl_t();                                         // 60
function bl_lock_h()       = 5 * bl_t();
function bl_lock_t()       = bl_t();
function bl_lock_slot_depth() = bl_lock_w() / 2;
function bl_lock_slot_h()  = bl_t();
function bl_lock_chamfer() = 1.5 * bl_t();

function bl_fin_len()      = 3 * p_bottle_d();                                   // 246
function bl_fin_h()        = p_fin_board_w();                                    // 93
function bl_fin_t()        = bl_t();
function bl_fin_lower_protrusion() = 2 * bl_t();
function bl_fin_slot_h()   = bl_t();
function bl_fin_slot_depth()   = p_bottle_d() / 2;
function bl_fin_upper_cut_depth() = p_bottle_d() + bl_t();   // +1 stock thickness so the bottle clears
function bl_fin_upper_cut_z0()    = bl_fin_lower_protrusion() + bl_fin_slot_h() + 1.5 * bl_t();
// One full board thickness of solid material between the chamfer and the
// slot above it (bl_fin_lower_protrusion() - bl_fin_front_chamfer() ==
// bl_t()): was 1.5*bl_t(), leaving only 0.5*bl_t() there -- a thin sliver
// right at the corner between two cuts, weaker than it needs to be.
function bl_fin_front_chamfer()   = bl_fin_lower_protrusion() - bl_t();   // = bl_t()

module bl_assert_valid() {
    t = bl_t();
    assert(p_bottle_h() > p_bottle_cap_h() && t > 0 && p_bottle_d() > 3 * t);
    assert(bl_core_h() - p_bottle_d() - t > 6 * t, "ballast: slat shoulders overlap.");
    assert(p_m5_hole_d() > 0
           && p_eco_screw_pair_offset() + p_m5_hole_d() / 2 < bl_core_w() / 2,
           "ballast: M5 hole pair runs off the core slat edges.");
    assert(bl_mount_hole_from_top() > p_m5_hole_d() / 2
           && bl_mount_hole_from_top() < p_bottle_d() - p_m5_hole_d() / 2,
           "ballast: mount holes miss the upper slat end.");
    assert(p_fin_board_w() > max(4.5 * t, p_bottle_d() / 2), "ballast: fin board too narrow.");
    assert(bl_core_w() == p_port_height() - 2 * t,
           "ballast: slat width must use the shared bottle diameter.");
    assert(bl_core_h() - bl_upper_diag_start() >= p_port_length() + t - 0.001,
           "ballast: top shoulder cut must begin at or below the John's port end.");
    assert(bl_upper_neck_start() > bl_lower_neck_start(),
           "ballast: upper and lower shoulder cuts overlap.");
    assert(abs((bl_slat_spacing() - bl_t()) - p_bottle_d()) < 0.001,
           "ballast: slat inner-face gap must equal the shared bottle diameter.");
    assert(bl_board_front_chamfer() >= 0
           && bl_board_front_chamfer() < bl_end_slot_offset()
           && bl_board_front_chamfer() < bl_board_slot_depth(),
           "ballast: board front chamfer would cut into a red-foot slot.");
    assert(abs(bl_center_slot_depth() - bl_fin_slot_depth()) < 0.001,
           "ballast: orange-base and yellow-fin slots must have equal depth.");
}

// ---- 2D profiles + parts -------------------------------------------
module bl_core_profile_2d()
    polygon([[0, 0], [bl_core_w(), 0],
             [bl_core_w(), bl_core_h()], [0, bl_core_h()],
             [0, bl_upper_diag_start()],
             [bl_shoulder_step(), bl_upper_neck_start()],
             [bl_shoulder_step(), bl_lower_neck_start()],
             [0, bl_lower_full_return()],
             [0, bl_core_slot_z1()],
             [bl_core_slot_depth(), bl_core_slot_z1()],
             [bl_core_slot_depth(), bl_core_slot_z0()],
             [0, bl_core_slot_z0()]]);

module ballast_core_slat_part(colored = true)
    wood_color([0.12, 0.38, 0.20], colored, p_wood_shade_ballast())
        linear_extrude(height = bl_t()) difference() {
            bl_core_profile_2d();
            // M5 pair, matching the Little John's clamp pair (v5.0.0)
            for (dx = [-p_eco_screw_pair_offset(), p_eco_screw_pair_offset()])
                translate([bl_mount_hole_x() + dx, bl_mount_hole_y()])
                    circle(d = p_m5_hole_d(), $fn = 16);
        }

module ballast_bottom_board_part(colored = true) {
    e = 0.01;
    wood_color([0.90, 0.38, 0.06], colored, p_wood_shade_ballast())
    linear_extrude(height = bl_t()) difference() {
        let(L = bl_board_len(), W = bl_board_w(), ch = bl_board_front_chamfer())
            polygon([[0, 0], [L, 0], [L, W - ch], [L - ch, W],
                     [ch, W], [0, W - ch]]);
        translate([bl_left_slot() - bl_board_slot_w() / 2, -e])
            square([bl_board_slot_w(), bl_board_slot_depth() + e]);
        translate([bl_center_slot() - bl_board_slot_w() / 2, -e])
            square([bl_board_slot_w(), bl_center_slot_depth() + e]);
        translate([bl_right_slot() - bl_board_slot_w() / 2, -e])
            square([bl_board_slot_w(), bl_board_slot_depth() + e]);
        translate([bl_left_end_slot_x0(), bl_board_w() - bl_board_slot_depth()])
            square([bl_board_slot_w(), bl_board_slot_depth() + e]);
        translate([bl_right_end_slot_x0(), bl_board_w() - bl_board_slot_depth()])
            square([bl_board_slot_w(), bl_board_slot_depth() + e]);
    }
}

module bl_lock_profile_2d() {
    y0 = (bl_lock_h() - bl_lock_slot_h()) / 2;
    y1 = y0 + bl_lock_slot_h();
    ch = bl_lock_chamfer();
    polygon([[0, 0], [bl_lock_w() - ch, 0], [bl_lock_w(), ch],
             [bl_lock_w(), bl_lock_h() - ch], [bl_lock_w() - ch, bl_lock_h()],
             [0, bl_lock_h()], [0, y1], [bl_lock_slot_depth(), y1],
             [bl_lock_slot_depth(), y0], [0, y0]]);
}

module ballast_lock_part(colored = true)
    wood_color([0.70, 0.12, 0.10], colored, p_wood_shade_ballast())
        linear_extrude(height = bl_lock_t()) bl_lock_profile_2d();

module bl_fin_profile_2d() {
    e = 0.01; ch = bl_fin_front_chamfer();
    difference() {
        polygon([[ch, 0], [bl_fin_len(), 0], [bl_fin_len(), bl_fin_h()],
                 [0, bl_fin_h()], [0, ch]]);
        translate([-e, bl_fin_lower_protrusion()])
            square([bl_fin_slot_depth() + e, bl_fin_slot_h()]);
        translate([-e, bl_fin_upper_cut_z0()])
            square([bl_fin_upper_cut_depth() + e, bl_fin_h() - bl_fin_upper_cut_z0() + e]);
    }
}

// Shares p_wood_shade_fin() with the rear fin so the two large fins read as a
// matched pair, distinct from the rest of the ballast.
module ballast_fin_part(colored = true)
    wood_color([0.95, 0.72, 0.02], colored, p_wood_shade_fin())
        linear_extrude(height = bl_fin_t()) bl_fin_profile_2d();

// ---- local assembly ------------------------------------------------
module bl_installed_green_slat(slot_center_x, colored = true)
    multmatrix([[0, 0, 1, slot_center_x - bl_t() / 2],
                [-1, 0, 0, bl_core_w()],
                [0, 1, 0, -bl_core_slot_z0()],
                [0, 0, 0, 1]])
        ballast_core_slat_part(colored);

module bl_installed_lock(slot_x0, colored = true) {
    lock_center_x = slot_x0 + bl_board_slot_w() / 2;
    lock_origin_y = (bl_board_w() - bl_board_slot_depth()) - bl_lock_slot_depth();
    y0 = (bl_lock_h() - bl_lock_slot_h()) / 2;
    multmatrix([[0, 0, 1, lock_center_x - bl_lock_t() / 2],
                [1, 0, 0, lock_origin_y],
                [0, 1, 0, -y0],
                [0, 0, 0, 1]])
        ballast_lock_part(colored);
}

module bl_installed_fin(inspection_pullout = 0, colored = true) {
    fin_origin_y = bl_center_slot_depth() + bl_fin_slot_depth() + inspection_pullout;
    multmatrix([[0, 0, 1, bl_center_slot() - bl_fin_t() / 2],
                [-1, 0, 0, fin_origin_y],
                [0, 1, 0, -bl_fin_lower_protrusion()],
                [0, 0, 0, 1]])
        ballast_fin_part(colored);
}

module local_ballast_assembly(inspection_pullout = 0, colored = true) {
    bl_assert_valid();
    ballast_bottom_board_part(colored);
    bl_installed_lock(bl_left_end_slot_x0(), colored);
    bl_installed_lock(bl_right_end_slot_x0(), colored);
    bl_installed_green_slat(bl_left_slot(), colored);
    bl_installed_green_slat(bl_right_slot(), colored);
    bl_installed_fin(inspection_pullout, colored);

    echo("BALLAST: slat w/len/t = ", bl_core_w(), bl_core_h(), bl_t(),
         " | inner-face gap = ", bl_slat_spacing() - bl_t(),
         " | M5 pair from slat top = ", bl_mount_hole_from_top());
}
// [bundle] end   <../../lib/ballast_fin.scad>

if (part == "assembly") {
    translate([0, 0, max(bl_lower_lobe(),
                         (bl_lock_h() - bl_lock_slot_h()) / 2,
                         bl_fin_lower_protrusion())])
        local_ballast_assembly(inspection_pullout = ballast_fin_inspection_pullout,
                               colored = enable_color_coding);
} else if (part == "core_slat") {
    ballast_core_slat_part(colored = enable_color_coding);
} else if (part == "bottom_board") {
    ballast_bottom_board_part(colored = enable_color_coding);
} else if (part == "lock_foot") {
    ballast_lock_part(colored = enable_color_coding);
} else if (part == "fin") {
    ballast_fin_part(colored = enable_color_coding);
} else {
    assert(false, str("Unknown part: ", part));
}
